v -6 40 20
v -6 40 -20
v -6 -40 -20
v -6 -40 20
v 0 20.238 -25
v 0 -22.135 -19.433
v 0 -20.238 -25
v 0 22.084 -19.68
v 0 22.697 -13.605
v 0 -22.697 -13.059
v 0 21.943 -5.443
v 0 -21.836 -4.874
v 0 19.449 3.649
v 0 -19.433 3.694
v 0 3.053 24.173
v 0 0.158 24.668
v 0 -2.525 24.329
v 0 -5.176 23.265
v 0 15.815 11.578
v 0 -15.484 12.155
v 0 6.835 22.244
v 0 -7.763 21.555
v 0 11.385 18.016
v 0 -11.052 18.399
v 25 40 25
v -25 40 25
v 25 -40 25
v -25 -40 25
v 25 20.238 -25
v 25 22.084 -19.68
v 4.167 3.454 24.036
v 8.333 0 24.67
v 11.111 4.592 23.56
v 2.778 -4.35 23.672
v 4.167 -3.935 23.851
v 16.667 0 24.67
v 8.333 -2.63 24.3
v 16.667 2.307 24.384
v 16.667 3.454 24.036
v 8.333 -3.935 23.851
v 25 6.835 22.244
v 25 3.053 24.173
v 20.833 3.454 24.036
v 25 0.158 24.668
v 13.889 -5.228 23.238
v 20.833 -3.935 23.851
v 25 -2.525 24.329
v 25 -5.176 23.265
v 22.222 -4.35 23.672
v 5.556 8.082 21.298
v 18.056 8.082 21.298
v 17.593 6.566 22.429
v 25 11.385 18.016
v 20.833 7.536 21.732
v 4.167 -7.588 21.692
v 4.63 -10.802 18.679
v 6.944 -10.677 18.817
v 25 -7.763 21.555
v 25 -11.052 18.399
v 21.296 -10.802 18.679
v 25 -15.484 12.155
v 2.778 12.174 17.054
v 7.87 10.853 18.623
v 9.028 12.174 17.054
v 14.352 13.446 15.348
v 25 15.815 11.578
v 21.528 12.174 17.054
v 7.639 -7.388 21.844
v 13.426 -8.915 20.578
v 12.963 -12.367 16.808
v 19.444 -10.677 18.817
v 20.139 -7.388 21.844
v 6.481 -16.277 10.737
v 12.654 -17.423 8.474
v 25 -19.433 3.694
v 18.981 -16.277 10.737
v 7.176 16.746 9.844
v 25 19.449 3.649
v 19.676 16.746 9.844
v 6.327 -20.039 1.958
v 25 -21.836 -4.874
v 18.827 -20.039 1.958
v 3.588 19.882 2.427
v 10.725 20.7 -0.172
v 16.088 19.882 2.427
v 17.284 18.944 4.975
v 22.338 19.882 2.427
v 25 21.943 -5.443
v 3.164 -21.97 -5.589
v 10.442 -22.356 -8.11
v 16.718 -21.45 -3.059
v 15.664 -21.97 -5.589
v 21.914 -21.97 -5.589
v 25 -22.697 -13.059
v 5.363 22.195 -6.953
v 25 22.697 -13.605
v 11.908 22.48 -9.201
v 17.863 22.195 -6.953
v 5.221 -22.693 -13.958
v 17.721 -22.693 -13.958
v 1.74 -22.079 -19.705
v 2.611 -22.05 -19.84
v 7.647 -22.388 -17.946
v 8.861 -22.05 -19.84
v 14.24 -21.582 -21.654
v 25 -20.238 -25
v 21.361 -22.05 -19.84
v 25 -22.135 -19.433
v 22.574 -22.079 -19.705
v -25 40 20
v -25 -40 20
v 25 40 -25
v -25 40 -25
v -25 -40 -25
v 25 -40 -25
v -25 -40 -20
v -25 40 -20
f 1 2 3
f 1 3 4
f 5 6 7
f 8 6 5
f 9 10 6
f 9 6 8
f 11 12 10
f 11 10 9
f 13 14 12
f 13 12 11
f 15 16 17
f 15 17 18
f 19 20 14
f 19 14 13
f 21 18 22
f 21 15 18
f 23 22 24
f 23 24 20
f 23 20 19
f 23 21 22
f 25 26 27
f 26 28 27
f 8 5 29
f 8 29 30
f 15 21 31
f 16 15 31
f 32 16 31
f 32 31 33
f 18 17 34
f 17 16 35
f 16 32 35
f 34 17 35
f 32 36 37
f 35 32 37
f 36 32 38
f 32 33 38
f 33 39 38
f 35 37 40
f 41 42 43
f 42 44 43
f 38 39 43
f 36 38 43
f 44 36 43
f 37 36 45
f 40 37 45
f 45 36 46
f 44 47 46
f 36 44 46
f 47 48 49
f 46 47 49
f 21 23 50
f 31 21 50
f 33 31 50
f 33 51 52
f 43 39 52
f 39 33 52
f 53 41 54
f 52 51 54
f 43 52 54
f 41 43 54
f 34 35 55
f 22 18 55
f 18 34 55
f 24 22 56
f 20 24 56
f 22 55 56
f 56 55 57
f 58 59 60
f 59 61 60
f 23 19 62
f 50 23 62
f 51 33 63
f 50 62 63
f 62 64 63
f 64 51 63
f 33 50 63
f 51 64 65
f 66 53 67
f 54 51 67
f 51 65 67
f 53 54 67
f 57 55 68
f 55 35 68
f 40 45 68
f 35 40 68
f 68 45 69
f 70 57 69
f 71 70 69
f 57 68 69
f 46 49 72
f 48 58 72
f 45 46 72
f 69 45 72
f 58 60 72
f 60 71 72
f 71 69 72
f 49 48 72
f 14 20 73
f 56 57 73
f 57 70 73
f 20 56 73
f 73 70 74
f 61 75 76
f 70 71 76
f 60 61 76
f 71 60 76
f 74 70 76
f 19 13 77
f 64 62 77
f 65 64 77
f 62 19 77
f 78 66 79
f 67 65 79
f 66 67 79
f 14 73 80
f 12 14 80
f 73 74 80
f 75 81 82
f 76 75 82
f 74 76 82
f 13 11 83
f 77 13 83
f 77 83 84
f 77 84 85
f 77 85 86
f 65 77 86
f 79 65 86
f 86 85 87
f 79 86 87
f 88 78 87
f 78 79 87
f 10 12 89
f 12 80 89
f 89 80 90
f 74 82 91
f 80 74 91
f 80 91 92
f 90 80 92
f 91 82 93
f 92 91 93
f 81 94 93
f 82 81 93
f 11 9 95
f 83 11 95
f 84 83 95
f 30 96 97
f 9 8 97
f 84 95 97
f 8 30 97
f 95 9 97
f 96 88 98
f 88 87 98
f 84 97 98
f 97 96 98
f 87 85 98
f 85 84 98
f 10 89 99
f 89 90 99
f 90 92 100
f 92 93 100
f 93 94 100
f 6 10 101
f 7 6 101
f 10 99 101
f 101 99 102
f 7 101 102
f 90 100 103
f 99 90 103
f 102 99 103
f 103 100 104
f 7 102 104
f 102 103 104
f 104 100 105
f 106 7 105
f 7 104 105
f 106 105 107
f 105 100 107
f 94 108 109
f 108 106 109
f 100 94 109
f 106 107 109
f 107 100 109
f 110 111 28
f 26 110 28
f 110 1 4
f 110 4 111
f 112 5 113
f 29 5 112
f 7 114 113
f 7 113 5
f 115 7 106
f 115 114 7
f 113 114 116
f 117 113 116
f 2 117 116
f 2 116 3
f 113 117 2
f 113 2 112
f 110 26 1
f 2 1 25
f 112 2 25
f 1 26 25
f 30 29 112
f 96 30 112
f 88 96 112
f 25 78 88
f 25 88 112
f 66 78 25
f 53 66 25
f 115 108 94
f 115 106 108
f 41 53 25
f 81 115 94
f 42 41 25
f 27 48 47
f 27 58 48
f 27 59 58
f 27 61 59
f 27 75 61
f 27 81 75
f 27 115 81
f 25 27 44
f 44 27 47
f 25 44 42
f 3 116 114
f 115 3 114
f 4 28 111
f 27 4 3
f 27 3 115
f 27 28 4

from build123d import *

# Parameters (mm, degrees)
F0_W     = 50
F0_H     = 50
F1_DEPTH = 40
F4_DEPTH = 25
F6_DEPTH = 40.0010001
F7_DEPTH = 40.0010001


with BuildPart() as f1:
    # F0 (on Front) → F1 (new body, symmetric)
    with BuildSketch(Plane.XZ):
        Rectangle(F0_W, F0_H)
    extrude(amount=F1_DEPTH, both=True)

    # F3 (on offset) → F4 (cut)
    with BuildSketch(Plane.YZ.offset(25)):
        with BuildLine():
            Line((20, -25.4437979311), (0, -25.4437979311))
            Line((0, -25.4437979311), (-20, -25.4437979311))
            add(Edge.make_bspline(
                [(20, -25.4437979311), (12.4066961802, -39.0920548923), (-12.4066961802, -39.0920548923), (-20, -25.4437979311)],
                knots=[0.6990551923, 0.6990551923, 0.6990551923, 0.6990551923, 1, 1, 1, 1], degree=3))
        make_face()
        with BuildLine():
            Line((-20, -25.4437979311), (0, -25.4437979311))
            Line((0, -25.4437979311), (20, -25.4437979311))
            add(Edge.make_bspline(
                [(-20, -25.4437979311), (-28.819122854, -9.5922453342), (0, 58.9319309233), (28.819122854, -9.5922453342), (20, -25.4437979311)],
                knots=[0, 0, 0, 0, 0.3495275962, 0.6990551923, 0.6990551923, 0.6990551923, 0.6990551923], degree=3))
        make_face()
    extrude(amount=-F4_DEPTH, mode=Mode.SUBTRACT)

    # F5 (on Front) → F6 (cut, through all)
    with BuildSketch(Plane.XZ):
        Polygon((-6, 20), (-30, 20), (-30, -20), (-6, -20), (-6, 0), align=None)
    extrude(amount=-F6_DEPTH, mode=Mode.SUBTRACT)

    # F5 (on Front) → F7 (cut, through all)
    with BuildSketch(Plane.XZ):
        Polygon((-6, 20), (-30, 20), (-30, -20), (-6, -20), (-6, 0), align=None)
    extrude(amount=F7_DEPTH, mode=Mode.SUBTRACT)


solid = f1.part
